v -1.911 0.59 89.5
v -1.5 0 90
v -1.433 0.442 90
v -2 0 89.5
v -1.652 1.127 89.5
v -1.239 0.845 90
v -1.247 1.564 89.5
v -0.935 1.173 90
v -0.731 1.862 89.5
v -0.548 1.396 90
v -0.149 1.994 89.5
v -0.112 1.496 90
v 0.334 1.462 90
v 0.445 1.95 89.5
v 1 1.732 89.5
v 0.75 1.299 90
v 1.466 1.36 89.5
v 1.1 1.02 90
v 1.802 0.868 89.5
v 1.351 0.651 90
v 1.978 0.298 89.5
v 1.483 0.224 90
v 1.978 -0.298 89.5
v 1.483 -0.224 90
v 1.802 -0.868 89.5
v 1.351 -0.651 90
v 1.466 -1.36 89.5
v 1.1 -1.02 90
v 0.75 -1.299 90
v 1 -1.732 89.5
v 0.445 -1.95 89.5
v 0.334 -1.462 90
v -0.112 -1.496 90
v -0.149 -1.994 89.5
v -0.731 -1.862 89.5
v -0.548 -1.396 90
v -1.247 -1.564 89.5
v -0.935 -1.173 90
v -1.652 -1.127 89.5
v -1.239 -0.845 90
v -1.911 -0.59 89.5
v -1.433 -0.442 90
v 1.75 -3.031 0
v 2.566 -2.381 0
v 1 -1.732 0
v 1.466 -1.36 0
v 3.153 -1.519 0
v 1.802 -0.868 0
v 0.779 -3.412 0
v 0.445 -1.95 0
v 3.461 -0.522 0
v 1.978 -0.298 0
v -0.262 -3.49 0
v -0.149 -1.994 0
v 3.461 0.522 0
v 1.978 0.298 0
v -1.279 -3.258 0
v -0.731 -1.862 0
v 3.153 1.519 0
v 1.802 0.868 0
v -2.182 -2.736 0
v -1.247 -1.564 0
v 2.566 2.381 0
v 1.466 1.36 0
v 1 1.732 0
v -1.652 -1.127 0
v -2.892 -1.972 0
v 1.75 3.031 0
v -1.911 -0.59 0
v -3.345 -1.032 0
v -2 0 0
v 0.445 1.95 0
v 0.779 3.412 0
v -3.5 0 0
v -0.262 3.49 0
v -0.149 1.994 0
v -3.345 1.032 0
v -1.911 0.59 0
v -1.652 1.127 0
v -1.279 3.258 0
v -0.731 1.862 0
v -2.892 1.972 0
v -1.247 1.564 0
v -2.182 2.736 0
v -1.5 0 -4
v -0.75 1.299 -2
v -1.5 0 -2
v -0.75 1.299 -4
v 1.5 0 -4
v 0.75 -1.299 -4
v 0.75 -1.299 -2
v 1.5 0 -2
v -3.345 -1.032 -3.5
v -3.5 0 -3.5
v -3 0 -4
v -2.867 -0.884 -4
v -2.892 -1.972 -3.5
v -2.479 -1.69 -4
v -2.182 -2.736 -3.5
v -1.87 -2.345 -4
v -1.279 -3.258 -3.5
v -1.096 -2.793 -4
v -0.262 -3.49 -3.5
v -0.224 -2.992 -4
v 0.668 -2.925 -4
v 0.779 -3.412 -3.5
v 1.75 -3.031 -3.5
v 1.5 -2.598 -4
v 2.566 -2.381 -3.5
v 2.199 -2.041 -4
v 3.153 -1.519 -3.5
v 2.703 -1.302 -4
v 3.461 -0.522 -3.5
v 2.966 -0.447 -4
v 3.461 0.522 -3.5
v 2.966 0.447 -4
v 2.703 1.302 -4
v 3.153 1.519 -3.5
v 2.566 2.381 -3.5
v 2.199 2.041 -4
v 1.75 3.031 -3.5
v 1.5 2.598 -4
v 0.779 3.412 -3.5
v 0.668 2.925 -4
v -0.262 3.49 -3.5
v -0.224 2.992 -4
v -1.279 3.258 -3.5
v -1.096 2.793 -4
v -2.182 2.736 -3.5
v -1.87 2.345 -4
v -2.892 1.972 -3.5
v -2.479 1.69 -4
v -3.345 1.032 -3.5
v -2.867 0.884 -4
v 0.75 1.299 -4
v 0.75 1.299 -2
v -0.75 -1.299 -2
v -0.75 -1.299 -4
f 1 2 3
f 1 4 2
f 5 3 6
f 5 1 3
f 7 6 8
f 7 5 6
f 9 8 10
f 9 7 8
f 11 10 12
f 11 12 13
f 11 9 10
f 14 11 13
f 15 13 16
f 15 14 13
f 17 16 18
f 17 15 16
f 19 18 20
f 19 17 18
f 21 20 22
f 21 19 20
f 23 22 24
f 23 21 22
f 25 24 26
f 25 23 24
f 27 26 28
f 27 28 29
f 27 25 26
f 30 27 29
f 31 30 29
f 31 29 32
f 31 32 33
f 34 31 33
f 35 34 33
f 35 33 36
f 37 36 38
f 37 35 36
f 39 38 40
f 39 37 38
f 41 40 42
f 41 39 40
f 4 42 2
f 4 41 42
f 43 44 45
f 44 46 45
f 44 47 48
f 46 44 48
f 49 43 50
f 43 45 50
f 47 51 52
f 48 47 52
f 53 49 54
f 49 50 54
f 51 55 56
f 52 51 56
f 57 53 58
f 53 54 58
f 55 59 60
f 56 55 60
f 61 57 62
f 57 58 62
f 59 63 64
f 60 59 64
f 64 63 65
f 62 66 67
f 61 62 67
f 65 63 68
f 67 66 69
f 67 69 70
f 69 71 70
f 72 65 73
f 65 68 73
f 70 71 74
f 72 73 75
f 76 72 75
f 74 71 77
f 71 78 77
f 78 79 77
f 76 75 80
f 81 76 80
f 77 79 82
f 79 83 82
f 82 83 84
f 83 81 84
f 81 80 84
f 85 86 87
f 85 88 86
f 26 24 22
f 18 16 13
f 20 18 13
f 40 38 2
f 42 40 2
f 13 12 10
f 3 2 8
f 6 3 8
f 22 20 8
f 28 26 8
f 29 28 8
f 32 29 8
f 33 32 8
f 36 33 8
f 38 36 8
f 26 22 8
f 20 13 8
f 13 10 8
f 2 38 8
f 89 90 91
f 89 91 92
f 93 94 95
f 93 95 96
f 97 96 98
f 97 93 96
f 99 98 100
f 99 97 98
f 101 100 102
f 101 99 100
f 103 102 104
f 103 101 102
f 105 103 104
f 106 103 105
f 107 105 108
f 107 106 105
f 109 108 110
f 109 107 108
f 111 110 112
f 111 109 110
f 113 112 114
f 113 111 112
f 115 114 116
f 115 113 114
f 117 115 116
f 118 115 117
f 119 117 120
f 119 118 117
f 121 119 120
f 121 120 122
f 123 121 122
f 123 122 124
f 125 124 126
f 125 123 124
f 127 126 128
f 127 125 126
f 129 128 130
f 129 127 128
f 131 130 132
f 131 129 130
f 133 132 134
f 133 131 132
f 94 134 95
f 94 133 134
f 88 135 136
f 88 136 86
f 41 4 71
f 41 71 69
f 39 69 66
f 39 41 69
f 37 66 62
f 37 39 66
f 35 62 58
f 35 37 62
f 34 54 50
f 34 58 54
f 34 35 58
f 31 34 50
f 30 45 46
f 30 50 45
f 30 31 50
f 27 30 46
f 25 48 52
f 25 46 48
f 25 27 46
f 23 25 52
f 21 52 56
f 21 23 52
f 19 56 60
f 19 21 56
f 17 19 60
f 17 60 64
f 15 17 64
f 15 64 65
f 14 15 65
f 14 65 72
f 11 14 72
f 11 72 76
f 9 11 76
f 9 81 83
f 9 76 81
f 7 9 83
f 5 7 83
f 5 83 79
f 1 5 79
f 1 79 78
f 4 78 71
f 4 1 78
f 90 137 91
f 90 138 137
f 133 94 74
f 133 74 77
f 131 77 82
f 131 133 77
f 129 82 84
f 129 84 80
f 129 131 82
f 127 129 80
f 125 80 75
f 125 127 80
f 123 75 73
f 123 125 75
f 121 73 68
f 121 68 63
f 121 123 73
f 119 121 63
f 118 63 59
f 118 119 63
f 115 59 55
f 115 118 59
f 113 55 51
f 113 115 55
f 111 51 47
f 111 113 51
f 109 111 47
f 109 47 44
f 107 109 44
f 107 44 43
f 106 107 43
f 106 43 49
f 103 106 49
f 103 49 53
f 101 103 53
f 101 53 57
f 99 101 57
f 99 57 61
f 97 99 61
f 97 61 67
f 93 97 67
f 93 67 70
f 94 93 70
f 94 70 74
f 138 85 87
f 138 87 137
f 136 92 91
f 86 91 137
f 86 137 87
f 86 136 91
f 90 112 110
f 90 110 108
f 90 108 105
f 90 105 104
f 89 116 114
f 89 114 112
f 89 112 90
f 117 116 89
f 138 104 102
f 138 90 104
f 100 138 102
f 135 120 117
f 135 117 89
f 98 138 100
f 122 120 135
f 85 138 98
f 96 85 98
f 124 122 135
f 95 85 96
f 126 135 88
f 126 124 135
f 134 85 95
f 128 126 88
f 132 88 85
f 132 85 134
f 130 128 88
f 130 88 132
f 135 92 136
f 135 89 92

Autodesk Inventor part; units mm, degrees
ref_plane "YZ Plane" through (0, 0, 0) normal (1, 0, 0) x (0, 1, 0)
ref_plane "XZ Plane" through (0, 0, 0) normal (0, 1, 0) x (-1, 0, 0)
ref_plane "XY Plane" through (0, 0, 0) normal (0, 0, 1) x (1, 0, 0)
sketch "Sketch1" plane through (0, 0, 0) normal (0, 1, 0) x (-1, 0, 0)
  line L0 (0, 0) -> (2, 0)
  line L1 (2, 0) -> (2, 90)
  line L2 (2, 90) -> (0, 90)
  line L3 (0, 90) -> (0, 0)
  line L4 (0, 0) -> (3.5, 0)
  line L5 (3.5, 0) -> (3.5, -4)
  line L6 (3.5, -4) -> (0, -4)
  line L7 (0, -4) -> (0, 0)
  dimension "d0" = 2
  dimension "d1" = 90
  dimension "d2" = 3.5
  dimension "d3" = 4
revolve "Revolution1" add sketch "Sketch1" angle 360 about axis through (0, 0, 90) along (0, 0, -1)
chamfer "Chamfer1" distance 0.5 angle 45 2 edges at (2, 0, 90) (3.5, 0, -4)
thread "Thread1" size "M4x0.7" class "6g" standard "ANSI Metric M Profile" length 40
sketch "Sketch2" plane through (0, 0, -4) normal (0, 0, -1) x (-1, 0, 0)
  line L0 (0, 0) -> (1.5, 0)
  line L1 (0, 0) -> (0.75, 1.299)
  line L2 (0, 0) -> (-0.75, 1.299)
  line L3 (0, 0) -> (-1.5, 0)
  line L4 (0, 0) -> (-0.75, -1.299)
  line L5 (0, 0) -> (0.75, -1.299)
  line L6 (0.75, 1.299) -> (1.5, 0)
  line L7 (1.5, 0) -> (0.75, -1.299)
  circle A0 centre (0, 0) radius 1.5 projected
  line L8 (0.75, -1.299) -> (-0.75, -1.299)
  line L9 (-0.75, -1.299) -> (-1.5, 0)
  line L10 (-1.5, 0) -> (-0.75, 1.299)
  line L11 (-0.75, 1.299) -> (0.75, 1.299)
  dimension "d10" = 1.5
  dimension "d13" = 360
extrude "Extrusion1" cut sketch "Sketch2" against normal blind 2 contours L1 L6 L0 | L2 L11 L1 | L3 L10 L2 | L4 L9 L3 | L5 L8 L4 | L0 L7 L5
properties part number "screw_4_90"
